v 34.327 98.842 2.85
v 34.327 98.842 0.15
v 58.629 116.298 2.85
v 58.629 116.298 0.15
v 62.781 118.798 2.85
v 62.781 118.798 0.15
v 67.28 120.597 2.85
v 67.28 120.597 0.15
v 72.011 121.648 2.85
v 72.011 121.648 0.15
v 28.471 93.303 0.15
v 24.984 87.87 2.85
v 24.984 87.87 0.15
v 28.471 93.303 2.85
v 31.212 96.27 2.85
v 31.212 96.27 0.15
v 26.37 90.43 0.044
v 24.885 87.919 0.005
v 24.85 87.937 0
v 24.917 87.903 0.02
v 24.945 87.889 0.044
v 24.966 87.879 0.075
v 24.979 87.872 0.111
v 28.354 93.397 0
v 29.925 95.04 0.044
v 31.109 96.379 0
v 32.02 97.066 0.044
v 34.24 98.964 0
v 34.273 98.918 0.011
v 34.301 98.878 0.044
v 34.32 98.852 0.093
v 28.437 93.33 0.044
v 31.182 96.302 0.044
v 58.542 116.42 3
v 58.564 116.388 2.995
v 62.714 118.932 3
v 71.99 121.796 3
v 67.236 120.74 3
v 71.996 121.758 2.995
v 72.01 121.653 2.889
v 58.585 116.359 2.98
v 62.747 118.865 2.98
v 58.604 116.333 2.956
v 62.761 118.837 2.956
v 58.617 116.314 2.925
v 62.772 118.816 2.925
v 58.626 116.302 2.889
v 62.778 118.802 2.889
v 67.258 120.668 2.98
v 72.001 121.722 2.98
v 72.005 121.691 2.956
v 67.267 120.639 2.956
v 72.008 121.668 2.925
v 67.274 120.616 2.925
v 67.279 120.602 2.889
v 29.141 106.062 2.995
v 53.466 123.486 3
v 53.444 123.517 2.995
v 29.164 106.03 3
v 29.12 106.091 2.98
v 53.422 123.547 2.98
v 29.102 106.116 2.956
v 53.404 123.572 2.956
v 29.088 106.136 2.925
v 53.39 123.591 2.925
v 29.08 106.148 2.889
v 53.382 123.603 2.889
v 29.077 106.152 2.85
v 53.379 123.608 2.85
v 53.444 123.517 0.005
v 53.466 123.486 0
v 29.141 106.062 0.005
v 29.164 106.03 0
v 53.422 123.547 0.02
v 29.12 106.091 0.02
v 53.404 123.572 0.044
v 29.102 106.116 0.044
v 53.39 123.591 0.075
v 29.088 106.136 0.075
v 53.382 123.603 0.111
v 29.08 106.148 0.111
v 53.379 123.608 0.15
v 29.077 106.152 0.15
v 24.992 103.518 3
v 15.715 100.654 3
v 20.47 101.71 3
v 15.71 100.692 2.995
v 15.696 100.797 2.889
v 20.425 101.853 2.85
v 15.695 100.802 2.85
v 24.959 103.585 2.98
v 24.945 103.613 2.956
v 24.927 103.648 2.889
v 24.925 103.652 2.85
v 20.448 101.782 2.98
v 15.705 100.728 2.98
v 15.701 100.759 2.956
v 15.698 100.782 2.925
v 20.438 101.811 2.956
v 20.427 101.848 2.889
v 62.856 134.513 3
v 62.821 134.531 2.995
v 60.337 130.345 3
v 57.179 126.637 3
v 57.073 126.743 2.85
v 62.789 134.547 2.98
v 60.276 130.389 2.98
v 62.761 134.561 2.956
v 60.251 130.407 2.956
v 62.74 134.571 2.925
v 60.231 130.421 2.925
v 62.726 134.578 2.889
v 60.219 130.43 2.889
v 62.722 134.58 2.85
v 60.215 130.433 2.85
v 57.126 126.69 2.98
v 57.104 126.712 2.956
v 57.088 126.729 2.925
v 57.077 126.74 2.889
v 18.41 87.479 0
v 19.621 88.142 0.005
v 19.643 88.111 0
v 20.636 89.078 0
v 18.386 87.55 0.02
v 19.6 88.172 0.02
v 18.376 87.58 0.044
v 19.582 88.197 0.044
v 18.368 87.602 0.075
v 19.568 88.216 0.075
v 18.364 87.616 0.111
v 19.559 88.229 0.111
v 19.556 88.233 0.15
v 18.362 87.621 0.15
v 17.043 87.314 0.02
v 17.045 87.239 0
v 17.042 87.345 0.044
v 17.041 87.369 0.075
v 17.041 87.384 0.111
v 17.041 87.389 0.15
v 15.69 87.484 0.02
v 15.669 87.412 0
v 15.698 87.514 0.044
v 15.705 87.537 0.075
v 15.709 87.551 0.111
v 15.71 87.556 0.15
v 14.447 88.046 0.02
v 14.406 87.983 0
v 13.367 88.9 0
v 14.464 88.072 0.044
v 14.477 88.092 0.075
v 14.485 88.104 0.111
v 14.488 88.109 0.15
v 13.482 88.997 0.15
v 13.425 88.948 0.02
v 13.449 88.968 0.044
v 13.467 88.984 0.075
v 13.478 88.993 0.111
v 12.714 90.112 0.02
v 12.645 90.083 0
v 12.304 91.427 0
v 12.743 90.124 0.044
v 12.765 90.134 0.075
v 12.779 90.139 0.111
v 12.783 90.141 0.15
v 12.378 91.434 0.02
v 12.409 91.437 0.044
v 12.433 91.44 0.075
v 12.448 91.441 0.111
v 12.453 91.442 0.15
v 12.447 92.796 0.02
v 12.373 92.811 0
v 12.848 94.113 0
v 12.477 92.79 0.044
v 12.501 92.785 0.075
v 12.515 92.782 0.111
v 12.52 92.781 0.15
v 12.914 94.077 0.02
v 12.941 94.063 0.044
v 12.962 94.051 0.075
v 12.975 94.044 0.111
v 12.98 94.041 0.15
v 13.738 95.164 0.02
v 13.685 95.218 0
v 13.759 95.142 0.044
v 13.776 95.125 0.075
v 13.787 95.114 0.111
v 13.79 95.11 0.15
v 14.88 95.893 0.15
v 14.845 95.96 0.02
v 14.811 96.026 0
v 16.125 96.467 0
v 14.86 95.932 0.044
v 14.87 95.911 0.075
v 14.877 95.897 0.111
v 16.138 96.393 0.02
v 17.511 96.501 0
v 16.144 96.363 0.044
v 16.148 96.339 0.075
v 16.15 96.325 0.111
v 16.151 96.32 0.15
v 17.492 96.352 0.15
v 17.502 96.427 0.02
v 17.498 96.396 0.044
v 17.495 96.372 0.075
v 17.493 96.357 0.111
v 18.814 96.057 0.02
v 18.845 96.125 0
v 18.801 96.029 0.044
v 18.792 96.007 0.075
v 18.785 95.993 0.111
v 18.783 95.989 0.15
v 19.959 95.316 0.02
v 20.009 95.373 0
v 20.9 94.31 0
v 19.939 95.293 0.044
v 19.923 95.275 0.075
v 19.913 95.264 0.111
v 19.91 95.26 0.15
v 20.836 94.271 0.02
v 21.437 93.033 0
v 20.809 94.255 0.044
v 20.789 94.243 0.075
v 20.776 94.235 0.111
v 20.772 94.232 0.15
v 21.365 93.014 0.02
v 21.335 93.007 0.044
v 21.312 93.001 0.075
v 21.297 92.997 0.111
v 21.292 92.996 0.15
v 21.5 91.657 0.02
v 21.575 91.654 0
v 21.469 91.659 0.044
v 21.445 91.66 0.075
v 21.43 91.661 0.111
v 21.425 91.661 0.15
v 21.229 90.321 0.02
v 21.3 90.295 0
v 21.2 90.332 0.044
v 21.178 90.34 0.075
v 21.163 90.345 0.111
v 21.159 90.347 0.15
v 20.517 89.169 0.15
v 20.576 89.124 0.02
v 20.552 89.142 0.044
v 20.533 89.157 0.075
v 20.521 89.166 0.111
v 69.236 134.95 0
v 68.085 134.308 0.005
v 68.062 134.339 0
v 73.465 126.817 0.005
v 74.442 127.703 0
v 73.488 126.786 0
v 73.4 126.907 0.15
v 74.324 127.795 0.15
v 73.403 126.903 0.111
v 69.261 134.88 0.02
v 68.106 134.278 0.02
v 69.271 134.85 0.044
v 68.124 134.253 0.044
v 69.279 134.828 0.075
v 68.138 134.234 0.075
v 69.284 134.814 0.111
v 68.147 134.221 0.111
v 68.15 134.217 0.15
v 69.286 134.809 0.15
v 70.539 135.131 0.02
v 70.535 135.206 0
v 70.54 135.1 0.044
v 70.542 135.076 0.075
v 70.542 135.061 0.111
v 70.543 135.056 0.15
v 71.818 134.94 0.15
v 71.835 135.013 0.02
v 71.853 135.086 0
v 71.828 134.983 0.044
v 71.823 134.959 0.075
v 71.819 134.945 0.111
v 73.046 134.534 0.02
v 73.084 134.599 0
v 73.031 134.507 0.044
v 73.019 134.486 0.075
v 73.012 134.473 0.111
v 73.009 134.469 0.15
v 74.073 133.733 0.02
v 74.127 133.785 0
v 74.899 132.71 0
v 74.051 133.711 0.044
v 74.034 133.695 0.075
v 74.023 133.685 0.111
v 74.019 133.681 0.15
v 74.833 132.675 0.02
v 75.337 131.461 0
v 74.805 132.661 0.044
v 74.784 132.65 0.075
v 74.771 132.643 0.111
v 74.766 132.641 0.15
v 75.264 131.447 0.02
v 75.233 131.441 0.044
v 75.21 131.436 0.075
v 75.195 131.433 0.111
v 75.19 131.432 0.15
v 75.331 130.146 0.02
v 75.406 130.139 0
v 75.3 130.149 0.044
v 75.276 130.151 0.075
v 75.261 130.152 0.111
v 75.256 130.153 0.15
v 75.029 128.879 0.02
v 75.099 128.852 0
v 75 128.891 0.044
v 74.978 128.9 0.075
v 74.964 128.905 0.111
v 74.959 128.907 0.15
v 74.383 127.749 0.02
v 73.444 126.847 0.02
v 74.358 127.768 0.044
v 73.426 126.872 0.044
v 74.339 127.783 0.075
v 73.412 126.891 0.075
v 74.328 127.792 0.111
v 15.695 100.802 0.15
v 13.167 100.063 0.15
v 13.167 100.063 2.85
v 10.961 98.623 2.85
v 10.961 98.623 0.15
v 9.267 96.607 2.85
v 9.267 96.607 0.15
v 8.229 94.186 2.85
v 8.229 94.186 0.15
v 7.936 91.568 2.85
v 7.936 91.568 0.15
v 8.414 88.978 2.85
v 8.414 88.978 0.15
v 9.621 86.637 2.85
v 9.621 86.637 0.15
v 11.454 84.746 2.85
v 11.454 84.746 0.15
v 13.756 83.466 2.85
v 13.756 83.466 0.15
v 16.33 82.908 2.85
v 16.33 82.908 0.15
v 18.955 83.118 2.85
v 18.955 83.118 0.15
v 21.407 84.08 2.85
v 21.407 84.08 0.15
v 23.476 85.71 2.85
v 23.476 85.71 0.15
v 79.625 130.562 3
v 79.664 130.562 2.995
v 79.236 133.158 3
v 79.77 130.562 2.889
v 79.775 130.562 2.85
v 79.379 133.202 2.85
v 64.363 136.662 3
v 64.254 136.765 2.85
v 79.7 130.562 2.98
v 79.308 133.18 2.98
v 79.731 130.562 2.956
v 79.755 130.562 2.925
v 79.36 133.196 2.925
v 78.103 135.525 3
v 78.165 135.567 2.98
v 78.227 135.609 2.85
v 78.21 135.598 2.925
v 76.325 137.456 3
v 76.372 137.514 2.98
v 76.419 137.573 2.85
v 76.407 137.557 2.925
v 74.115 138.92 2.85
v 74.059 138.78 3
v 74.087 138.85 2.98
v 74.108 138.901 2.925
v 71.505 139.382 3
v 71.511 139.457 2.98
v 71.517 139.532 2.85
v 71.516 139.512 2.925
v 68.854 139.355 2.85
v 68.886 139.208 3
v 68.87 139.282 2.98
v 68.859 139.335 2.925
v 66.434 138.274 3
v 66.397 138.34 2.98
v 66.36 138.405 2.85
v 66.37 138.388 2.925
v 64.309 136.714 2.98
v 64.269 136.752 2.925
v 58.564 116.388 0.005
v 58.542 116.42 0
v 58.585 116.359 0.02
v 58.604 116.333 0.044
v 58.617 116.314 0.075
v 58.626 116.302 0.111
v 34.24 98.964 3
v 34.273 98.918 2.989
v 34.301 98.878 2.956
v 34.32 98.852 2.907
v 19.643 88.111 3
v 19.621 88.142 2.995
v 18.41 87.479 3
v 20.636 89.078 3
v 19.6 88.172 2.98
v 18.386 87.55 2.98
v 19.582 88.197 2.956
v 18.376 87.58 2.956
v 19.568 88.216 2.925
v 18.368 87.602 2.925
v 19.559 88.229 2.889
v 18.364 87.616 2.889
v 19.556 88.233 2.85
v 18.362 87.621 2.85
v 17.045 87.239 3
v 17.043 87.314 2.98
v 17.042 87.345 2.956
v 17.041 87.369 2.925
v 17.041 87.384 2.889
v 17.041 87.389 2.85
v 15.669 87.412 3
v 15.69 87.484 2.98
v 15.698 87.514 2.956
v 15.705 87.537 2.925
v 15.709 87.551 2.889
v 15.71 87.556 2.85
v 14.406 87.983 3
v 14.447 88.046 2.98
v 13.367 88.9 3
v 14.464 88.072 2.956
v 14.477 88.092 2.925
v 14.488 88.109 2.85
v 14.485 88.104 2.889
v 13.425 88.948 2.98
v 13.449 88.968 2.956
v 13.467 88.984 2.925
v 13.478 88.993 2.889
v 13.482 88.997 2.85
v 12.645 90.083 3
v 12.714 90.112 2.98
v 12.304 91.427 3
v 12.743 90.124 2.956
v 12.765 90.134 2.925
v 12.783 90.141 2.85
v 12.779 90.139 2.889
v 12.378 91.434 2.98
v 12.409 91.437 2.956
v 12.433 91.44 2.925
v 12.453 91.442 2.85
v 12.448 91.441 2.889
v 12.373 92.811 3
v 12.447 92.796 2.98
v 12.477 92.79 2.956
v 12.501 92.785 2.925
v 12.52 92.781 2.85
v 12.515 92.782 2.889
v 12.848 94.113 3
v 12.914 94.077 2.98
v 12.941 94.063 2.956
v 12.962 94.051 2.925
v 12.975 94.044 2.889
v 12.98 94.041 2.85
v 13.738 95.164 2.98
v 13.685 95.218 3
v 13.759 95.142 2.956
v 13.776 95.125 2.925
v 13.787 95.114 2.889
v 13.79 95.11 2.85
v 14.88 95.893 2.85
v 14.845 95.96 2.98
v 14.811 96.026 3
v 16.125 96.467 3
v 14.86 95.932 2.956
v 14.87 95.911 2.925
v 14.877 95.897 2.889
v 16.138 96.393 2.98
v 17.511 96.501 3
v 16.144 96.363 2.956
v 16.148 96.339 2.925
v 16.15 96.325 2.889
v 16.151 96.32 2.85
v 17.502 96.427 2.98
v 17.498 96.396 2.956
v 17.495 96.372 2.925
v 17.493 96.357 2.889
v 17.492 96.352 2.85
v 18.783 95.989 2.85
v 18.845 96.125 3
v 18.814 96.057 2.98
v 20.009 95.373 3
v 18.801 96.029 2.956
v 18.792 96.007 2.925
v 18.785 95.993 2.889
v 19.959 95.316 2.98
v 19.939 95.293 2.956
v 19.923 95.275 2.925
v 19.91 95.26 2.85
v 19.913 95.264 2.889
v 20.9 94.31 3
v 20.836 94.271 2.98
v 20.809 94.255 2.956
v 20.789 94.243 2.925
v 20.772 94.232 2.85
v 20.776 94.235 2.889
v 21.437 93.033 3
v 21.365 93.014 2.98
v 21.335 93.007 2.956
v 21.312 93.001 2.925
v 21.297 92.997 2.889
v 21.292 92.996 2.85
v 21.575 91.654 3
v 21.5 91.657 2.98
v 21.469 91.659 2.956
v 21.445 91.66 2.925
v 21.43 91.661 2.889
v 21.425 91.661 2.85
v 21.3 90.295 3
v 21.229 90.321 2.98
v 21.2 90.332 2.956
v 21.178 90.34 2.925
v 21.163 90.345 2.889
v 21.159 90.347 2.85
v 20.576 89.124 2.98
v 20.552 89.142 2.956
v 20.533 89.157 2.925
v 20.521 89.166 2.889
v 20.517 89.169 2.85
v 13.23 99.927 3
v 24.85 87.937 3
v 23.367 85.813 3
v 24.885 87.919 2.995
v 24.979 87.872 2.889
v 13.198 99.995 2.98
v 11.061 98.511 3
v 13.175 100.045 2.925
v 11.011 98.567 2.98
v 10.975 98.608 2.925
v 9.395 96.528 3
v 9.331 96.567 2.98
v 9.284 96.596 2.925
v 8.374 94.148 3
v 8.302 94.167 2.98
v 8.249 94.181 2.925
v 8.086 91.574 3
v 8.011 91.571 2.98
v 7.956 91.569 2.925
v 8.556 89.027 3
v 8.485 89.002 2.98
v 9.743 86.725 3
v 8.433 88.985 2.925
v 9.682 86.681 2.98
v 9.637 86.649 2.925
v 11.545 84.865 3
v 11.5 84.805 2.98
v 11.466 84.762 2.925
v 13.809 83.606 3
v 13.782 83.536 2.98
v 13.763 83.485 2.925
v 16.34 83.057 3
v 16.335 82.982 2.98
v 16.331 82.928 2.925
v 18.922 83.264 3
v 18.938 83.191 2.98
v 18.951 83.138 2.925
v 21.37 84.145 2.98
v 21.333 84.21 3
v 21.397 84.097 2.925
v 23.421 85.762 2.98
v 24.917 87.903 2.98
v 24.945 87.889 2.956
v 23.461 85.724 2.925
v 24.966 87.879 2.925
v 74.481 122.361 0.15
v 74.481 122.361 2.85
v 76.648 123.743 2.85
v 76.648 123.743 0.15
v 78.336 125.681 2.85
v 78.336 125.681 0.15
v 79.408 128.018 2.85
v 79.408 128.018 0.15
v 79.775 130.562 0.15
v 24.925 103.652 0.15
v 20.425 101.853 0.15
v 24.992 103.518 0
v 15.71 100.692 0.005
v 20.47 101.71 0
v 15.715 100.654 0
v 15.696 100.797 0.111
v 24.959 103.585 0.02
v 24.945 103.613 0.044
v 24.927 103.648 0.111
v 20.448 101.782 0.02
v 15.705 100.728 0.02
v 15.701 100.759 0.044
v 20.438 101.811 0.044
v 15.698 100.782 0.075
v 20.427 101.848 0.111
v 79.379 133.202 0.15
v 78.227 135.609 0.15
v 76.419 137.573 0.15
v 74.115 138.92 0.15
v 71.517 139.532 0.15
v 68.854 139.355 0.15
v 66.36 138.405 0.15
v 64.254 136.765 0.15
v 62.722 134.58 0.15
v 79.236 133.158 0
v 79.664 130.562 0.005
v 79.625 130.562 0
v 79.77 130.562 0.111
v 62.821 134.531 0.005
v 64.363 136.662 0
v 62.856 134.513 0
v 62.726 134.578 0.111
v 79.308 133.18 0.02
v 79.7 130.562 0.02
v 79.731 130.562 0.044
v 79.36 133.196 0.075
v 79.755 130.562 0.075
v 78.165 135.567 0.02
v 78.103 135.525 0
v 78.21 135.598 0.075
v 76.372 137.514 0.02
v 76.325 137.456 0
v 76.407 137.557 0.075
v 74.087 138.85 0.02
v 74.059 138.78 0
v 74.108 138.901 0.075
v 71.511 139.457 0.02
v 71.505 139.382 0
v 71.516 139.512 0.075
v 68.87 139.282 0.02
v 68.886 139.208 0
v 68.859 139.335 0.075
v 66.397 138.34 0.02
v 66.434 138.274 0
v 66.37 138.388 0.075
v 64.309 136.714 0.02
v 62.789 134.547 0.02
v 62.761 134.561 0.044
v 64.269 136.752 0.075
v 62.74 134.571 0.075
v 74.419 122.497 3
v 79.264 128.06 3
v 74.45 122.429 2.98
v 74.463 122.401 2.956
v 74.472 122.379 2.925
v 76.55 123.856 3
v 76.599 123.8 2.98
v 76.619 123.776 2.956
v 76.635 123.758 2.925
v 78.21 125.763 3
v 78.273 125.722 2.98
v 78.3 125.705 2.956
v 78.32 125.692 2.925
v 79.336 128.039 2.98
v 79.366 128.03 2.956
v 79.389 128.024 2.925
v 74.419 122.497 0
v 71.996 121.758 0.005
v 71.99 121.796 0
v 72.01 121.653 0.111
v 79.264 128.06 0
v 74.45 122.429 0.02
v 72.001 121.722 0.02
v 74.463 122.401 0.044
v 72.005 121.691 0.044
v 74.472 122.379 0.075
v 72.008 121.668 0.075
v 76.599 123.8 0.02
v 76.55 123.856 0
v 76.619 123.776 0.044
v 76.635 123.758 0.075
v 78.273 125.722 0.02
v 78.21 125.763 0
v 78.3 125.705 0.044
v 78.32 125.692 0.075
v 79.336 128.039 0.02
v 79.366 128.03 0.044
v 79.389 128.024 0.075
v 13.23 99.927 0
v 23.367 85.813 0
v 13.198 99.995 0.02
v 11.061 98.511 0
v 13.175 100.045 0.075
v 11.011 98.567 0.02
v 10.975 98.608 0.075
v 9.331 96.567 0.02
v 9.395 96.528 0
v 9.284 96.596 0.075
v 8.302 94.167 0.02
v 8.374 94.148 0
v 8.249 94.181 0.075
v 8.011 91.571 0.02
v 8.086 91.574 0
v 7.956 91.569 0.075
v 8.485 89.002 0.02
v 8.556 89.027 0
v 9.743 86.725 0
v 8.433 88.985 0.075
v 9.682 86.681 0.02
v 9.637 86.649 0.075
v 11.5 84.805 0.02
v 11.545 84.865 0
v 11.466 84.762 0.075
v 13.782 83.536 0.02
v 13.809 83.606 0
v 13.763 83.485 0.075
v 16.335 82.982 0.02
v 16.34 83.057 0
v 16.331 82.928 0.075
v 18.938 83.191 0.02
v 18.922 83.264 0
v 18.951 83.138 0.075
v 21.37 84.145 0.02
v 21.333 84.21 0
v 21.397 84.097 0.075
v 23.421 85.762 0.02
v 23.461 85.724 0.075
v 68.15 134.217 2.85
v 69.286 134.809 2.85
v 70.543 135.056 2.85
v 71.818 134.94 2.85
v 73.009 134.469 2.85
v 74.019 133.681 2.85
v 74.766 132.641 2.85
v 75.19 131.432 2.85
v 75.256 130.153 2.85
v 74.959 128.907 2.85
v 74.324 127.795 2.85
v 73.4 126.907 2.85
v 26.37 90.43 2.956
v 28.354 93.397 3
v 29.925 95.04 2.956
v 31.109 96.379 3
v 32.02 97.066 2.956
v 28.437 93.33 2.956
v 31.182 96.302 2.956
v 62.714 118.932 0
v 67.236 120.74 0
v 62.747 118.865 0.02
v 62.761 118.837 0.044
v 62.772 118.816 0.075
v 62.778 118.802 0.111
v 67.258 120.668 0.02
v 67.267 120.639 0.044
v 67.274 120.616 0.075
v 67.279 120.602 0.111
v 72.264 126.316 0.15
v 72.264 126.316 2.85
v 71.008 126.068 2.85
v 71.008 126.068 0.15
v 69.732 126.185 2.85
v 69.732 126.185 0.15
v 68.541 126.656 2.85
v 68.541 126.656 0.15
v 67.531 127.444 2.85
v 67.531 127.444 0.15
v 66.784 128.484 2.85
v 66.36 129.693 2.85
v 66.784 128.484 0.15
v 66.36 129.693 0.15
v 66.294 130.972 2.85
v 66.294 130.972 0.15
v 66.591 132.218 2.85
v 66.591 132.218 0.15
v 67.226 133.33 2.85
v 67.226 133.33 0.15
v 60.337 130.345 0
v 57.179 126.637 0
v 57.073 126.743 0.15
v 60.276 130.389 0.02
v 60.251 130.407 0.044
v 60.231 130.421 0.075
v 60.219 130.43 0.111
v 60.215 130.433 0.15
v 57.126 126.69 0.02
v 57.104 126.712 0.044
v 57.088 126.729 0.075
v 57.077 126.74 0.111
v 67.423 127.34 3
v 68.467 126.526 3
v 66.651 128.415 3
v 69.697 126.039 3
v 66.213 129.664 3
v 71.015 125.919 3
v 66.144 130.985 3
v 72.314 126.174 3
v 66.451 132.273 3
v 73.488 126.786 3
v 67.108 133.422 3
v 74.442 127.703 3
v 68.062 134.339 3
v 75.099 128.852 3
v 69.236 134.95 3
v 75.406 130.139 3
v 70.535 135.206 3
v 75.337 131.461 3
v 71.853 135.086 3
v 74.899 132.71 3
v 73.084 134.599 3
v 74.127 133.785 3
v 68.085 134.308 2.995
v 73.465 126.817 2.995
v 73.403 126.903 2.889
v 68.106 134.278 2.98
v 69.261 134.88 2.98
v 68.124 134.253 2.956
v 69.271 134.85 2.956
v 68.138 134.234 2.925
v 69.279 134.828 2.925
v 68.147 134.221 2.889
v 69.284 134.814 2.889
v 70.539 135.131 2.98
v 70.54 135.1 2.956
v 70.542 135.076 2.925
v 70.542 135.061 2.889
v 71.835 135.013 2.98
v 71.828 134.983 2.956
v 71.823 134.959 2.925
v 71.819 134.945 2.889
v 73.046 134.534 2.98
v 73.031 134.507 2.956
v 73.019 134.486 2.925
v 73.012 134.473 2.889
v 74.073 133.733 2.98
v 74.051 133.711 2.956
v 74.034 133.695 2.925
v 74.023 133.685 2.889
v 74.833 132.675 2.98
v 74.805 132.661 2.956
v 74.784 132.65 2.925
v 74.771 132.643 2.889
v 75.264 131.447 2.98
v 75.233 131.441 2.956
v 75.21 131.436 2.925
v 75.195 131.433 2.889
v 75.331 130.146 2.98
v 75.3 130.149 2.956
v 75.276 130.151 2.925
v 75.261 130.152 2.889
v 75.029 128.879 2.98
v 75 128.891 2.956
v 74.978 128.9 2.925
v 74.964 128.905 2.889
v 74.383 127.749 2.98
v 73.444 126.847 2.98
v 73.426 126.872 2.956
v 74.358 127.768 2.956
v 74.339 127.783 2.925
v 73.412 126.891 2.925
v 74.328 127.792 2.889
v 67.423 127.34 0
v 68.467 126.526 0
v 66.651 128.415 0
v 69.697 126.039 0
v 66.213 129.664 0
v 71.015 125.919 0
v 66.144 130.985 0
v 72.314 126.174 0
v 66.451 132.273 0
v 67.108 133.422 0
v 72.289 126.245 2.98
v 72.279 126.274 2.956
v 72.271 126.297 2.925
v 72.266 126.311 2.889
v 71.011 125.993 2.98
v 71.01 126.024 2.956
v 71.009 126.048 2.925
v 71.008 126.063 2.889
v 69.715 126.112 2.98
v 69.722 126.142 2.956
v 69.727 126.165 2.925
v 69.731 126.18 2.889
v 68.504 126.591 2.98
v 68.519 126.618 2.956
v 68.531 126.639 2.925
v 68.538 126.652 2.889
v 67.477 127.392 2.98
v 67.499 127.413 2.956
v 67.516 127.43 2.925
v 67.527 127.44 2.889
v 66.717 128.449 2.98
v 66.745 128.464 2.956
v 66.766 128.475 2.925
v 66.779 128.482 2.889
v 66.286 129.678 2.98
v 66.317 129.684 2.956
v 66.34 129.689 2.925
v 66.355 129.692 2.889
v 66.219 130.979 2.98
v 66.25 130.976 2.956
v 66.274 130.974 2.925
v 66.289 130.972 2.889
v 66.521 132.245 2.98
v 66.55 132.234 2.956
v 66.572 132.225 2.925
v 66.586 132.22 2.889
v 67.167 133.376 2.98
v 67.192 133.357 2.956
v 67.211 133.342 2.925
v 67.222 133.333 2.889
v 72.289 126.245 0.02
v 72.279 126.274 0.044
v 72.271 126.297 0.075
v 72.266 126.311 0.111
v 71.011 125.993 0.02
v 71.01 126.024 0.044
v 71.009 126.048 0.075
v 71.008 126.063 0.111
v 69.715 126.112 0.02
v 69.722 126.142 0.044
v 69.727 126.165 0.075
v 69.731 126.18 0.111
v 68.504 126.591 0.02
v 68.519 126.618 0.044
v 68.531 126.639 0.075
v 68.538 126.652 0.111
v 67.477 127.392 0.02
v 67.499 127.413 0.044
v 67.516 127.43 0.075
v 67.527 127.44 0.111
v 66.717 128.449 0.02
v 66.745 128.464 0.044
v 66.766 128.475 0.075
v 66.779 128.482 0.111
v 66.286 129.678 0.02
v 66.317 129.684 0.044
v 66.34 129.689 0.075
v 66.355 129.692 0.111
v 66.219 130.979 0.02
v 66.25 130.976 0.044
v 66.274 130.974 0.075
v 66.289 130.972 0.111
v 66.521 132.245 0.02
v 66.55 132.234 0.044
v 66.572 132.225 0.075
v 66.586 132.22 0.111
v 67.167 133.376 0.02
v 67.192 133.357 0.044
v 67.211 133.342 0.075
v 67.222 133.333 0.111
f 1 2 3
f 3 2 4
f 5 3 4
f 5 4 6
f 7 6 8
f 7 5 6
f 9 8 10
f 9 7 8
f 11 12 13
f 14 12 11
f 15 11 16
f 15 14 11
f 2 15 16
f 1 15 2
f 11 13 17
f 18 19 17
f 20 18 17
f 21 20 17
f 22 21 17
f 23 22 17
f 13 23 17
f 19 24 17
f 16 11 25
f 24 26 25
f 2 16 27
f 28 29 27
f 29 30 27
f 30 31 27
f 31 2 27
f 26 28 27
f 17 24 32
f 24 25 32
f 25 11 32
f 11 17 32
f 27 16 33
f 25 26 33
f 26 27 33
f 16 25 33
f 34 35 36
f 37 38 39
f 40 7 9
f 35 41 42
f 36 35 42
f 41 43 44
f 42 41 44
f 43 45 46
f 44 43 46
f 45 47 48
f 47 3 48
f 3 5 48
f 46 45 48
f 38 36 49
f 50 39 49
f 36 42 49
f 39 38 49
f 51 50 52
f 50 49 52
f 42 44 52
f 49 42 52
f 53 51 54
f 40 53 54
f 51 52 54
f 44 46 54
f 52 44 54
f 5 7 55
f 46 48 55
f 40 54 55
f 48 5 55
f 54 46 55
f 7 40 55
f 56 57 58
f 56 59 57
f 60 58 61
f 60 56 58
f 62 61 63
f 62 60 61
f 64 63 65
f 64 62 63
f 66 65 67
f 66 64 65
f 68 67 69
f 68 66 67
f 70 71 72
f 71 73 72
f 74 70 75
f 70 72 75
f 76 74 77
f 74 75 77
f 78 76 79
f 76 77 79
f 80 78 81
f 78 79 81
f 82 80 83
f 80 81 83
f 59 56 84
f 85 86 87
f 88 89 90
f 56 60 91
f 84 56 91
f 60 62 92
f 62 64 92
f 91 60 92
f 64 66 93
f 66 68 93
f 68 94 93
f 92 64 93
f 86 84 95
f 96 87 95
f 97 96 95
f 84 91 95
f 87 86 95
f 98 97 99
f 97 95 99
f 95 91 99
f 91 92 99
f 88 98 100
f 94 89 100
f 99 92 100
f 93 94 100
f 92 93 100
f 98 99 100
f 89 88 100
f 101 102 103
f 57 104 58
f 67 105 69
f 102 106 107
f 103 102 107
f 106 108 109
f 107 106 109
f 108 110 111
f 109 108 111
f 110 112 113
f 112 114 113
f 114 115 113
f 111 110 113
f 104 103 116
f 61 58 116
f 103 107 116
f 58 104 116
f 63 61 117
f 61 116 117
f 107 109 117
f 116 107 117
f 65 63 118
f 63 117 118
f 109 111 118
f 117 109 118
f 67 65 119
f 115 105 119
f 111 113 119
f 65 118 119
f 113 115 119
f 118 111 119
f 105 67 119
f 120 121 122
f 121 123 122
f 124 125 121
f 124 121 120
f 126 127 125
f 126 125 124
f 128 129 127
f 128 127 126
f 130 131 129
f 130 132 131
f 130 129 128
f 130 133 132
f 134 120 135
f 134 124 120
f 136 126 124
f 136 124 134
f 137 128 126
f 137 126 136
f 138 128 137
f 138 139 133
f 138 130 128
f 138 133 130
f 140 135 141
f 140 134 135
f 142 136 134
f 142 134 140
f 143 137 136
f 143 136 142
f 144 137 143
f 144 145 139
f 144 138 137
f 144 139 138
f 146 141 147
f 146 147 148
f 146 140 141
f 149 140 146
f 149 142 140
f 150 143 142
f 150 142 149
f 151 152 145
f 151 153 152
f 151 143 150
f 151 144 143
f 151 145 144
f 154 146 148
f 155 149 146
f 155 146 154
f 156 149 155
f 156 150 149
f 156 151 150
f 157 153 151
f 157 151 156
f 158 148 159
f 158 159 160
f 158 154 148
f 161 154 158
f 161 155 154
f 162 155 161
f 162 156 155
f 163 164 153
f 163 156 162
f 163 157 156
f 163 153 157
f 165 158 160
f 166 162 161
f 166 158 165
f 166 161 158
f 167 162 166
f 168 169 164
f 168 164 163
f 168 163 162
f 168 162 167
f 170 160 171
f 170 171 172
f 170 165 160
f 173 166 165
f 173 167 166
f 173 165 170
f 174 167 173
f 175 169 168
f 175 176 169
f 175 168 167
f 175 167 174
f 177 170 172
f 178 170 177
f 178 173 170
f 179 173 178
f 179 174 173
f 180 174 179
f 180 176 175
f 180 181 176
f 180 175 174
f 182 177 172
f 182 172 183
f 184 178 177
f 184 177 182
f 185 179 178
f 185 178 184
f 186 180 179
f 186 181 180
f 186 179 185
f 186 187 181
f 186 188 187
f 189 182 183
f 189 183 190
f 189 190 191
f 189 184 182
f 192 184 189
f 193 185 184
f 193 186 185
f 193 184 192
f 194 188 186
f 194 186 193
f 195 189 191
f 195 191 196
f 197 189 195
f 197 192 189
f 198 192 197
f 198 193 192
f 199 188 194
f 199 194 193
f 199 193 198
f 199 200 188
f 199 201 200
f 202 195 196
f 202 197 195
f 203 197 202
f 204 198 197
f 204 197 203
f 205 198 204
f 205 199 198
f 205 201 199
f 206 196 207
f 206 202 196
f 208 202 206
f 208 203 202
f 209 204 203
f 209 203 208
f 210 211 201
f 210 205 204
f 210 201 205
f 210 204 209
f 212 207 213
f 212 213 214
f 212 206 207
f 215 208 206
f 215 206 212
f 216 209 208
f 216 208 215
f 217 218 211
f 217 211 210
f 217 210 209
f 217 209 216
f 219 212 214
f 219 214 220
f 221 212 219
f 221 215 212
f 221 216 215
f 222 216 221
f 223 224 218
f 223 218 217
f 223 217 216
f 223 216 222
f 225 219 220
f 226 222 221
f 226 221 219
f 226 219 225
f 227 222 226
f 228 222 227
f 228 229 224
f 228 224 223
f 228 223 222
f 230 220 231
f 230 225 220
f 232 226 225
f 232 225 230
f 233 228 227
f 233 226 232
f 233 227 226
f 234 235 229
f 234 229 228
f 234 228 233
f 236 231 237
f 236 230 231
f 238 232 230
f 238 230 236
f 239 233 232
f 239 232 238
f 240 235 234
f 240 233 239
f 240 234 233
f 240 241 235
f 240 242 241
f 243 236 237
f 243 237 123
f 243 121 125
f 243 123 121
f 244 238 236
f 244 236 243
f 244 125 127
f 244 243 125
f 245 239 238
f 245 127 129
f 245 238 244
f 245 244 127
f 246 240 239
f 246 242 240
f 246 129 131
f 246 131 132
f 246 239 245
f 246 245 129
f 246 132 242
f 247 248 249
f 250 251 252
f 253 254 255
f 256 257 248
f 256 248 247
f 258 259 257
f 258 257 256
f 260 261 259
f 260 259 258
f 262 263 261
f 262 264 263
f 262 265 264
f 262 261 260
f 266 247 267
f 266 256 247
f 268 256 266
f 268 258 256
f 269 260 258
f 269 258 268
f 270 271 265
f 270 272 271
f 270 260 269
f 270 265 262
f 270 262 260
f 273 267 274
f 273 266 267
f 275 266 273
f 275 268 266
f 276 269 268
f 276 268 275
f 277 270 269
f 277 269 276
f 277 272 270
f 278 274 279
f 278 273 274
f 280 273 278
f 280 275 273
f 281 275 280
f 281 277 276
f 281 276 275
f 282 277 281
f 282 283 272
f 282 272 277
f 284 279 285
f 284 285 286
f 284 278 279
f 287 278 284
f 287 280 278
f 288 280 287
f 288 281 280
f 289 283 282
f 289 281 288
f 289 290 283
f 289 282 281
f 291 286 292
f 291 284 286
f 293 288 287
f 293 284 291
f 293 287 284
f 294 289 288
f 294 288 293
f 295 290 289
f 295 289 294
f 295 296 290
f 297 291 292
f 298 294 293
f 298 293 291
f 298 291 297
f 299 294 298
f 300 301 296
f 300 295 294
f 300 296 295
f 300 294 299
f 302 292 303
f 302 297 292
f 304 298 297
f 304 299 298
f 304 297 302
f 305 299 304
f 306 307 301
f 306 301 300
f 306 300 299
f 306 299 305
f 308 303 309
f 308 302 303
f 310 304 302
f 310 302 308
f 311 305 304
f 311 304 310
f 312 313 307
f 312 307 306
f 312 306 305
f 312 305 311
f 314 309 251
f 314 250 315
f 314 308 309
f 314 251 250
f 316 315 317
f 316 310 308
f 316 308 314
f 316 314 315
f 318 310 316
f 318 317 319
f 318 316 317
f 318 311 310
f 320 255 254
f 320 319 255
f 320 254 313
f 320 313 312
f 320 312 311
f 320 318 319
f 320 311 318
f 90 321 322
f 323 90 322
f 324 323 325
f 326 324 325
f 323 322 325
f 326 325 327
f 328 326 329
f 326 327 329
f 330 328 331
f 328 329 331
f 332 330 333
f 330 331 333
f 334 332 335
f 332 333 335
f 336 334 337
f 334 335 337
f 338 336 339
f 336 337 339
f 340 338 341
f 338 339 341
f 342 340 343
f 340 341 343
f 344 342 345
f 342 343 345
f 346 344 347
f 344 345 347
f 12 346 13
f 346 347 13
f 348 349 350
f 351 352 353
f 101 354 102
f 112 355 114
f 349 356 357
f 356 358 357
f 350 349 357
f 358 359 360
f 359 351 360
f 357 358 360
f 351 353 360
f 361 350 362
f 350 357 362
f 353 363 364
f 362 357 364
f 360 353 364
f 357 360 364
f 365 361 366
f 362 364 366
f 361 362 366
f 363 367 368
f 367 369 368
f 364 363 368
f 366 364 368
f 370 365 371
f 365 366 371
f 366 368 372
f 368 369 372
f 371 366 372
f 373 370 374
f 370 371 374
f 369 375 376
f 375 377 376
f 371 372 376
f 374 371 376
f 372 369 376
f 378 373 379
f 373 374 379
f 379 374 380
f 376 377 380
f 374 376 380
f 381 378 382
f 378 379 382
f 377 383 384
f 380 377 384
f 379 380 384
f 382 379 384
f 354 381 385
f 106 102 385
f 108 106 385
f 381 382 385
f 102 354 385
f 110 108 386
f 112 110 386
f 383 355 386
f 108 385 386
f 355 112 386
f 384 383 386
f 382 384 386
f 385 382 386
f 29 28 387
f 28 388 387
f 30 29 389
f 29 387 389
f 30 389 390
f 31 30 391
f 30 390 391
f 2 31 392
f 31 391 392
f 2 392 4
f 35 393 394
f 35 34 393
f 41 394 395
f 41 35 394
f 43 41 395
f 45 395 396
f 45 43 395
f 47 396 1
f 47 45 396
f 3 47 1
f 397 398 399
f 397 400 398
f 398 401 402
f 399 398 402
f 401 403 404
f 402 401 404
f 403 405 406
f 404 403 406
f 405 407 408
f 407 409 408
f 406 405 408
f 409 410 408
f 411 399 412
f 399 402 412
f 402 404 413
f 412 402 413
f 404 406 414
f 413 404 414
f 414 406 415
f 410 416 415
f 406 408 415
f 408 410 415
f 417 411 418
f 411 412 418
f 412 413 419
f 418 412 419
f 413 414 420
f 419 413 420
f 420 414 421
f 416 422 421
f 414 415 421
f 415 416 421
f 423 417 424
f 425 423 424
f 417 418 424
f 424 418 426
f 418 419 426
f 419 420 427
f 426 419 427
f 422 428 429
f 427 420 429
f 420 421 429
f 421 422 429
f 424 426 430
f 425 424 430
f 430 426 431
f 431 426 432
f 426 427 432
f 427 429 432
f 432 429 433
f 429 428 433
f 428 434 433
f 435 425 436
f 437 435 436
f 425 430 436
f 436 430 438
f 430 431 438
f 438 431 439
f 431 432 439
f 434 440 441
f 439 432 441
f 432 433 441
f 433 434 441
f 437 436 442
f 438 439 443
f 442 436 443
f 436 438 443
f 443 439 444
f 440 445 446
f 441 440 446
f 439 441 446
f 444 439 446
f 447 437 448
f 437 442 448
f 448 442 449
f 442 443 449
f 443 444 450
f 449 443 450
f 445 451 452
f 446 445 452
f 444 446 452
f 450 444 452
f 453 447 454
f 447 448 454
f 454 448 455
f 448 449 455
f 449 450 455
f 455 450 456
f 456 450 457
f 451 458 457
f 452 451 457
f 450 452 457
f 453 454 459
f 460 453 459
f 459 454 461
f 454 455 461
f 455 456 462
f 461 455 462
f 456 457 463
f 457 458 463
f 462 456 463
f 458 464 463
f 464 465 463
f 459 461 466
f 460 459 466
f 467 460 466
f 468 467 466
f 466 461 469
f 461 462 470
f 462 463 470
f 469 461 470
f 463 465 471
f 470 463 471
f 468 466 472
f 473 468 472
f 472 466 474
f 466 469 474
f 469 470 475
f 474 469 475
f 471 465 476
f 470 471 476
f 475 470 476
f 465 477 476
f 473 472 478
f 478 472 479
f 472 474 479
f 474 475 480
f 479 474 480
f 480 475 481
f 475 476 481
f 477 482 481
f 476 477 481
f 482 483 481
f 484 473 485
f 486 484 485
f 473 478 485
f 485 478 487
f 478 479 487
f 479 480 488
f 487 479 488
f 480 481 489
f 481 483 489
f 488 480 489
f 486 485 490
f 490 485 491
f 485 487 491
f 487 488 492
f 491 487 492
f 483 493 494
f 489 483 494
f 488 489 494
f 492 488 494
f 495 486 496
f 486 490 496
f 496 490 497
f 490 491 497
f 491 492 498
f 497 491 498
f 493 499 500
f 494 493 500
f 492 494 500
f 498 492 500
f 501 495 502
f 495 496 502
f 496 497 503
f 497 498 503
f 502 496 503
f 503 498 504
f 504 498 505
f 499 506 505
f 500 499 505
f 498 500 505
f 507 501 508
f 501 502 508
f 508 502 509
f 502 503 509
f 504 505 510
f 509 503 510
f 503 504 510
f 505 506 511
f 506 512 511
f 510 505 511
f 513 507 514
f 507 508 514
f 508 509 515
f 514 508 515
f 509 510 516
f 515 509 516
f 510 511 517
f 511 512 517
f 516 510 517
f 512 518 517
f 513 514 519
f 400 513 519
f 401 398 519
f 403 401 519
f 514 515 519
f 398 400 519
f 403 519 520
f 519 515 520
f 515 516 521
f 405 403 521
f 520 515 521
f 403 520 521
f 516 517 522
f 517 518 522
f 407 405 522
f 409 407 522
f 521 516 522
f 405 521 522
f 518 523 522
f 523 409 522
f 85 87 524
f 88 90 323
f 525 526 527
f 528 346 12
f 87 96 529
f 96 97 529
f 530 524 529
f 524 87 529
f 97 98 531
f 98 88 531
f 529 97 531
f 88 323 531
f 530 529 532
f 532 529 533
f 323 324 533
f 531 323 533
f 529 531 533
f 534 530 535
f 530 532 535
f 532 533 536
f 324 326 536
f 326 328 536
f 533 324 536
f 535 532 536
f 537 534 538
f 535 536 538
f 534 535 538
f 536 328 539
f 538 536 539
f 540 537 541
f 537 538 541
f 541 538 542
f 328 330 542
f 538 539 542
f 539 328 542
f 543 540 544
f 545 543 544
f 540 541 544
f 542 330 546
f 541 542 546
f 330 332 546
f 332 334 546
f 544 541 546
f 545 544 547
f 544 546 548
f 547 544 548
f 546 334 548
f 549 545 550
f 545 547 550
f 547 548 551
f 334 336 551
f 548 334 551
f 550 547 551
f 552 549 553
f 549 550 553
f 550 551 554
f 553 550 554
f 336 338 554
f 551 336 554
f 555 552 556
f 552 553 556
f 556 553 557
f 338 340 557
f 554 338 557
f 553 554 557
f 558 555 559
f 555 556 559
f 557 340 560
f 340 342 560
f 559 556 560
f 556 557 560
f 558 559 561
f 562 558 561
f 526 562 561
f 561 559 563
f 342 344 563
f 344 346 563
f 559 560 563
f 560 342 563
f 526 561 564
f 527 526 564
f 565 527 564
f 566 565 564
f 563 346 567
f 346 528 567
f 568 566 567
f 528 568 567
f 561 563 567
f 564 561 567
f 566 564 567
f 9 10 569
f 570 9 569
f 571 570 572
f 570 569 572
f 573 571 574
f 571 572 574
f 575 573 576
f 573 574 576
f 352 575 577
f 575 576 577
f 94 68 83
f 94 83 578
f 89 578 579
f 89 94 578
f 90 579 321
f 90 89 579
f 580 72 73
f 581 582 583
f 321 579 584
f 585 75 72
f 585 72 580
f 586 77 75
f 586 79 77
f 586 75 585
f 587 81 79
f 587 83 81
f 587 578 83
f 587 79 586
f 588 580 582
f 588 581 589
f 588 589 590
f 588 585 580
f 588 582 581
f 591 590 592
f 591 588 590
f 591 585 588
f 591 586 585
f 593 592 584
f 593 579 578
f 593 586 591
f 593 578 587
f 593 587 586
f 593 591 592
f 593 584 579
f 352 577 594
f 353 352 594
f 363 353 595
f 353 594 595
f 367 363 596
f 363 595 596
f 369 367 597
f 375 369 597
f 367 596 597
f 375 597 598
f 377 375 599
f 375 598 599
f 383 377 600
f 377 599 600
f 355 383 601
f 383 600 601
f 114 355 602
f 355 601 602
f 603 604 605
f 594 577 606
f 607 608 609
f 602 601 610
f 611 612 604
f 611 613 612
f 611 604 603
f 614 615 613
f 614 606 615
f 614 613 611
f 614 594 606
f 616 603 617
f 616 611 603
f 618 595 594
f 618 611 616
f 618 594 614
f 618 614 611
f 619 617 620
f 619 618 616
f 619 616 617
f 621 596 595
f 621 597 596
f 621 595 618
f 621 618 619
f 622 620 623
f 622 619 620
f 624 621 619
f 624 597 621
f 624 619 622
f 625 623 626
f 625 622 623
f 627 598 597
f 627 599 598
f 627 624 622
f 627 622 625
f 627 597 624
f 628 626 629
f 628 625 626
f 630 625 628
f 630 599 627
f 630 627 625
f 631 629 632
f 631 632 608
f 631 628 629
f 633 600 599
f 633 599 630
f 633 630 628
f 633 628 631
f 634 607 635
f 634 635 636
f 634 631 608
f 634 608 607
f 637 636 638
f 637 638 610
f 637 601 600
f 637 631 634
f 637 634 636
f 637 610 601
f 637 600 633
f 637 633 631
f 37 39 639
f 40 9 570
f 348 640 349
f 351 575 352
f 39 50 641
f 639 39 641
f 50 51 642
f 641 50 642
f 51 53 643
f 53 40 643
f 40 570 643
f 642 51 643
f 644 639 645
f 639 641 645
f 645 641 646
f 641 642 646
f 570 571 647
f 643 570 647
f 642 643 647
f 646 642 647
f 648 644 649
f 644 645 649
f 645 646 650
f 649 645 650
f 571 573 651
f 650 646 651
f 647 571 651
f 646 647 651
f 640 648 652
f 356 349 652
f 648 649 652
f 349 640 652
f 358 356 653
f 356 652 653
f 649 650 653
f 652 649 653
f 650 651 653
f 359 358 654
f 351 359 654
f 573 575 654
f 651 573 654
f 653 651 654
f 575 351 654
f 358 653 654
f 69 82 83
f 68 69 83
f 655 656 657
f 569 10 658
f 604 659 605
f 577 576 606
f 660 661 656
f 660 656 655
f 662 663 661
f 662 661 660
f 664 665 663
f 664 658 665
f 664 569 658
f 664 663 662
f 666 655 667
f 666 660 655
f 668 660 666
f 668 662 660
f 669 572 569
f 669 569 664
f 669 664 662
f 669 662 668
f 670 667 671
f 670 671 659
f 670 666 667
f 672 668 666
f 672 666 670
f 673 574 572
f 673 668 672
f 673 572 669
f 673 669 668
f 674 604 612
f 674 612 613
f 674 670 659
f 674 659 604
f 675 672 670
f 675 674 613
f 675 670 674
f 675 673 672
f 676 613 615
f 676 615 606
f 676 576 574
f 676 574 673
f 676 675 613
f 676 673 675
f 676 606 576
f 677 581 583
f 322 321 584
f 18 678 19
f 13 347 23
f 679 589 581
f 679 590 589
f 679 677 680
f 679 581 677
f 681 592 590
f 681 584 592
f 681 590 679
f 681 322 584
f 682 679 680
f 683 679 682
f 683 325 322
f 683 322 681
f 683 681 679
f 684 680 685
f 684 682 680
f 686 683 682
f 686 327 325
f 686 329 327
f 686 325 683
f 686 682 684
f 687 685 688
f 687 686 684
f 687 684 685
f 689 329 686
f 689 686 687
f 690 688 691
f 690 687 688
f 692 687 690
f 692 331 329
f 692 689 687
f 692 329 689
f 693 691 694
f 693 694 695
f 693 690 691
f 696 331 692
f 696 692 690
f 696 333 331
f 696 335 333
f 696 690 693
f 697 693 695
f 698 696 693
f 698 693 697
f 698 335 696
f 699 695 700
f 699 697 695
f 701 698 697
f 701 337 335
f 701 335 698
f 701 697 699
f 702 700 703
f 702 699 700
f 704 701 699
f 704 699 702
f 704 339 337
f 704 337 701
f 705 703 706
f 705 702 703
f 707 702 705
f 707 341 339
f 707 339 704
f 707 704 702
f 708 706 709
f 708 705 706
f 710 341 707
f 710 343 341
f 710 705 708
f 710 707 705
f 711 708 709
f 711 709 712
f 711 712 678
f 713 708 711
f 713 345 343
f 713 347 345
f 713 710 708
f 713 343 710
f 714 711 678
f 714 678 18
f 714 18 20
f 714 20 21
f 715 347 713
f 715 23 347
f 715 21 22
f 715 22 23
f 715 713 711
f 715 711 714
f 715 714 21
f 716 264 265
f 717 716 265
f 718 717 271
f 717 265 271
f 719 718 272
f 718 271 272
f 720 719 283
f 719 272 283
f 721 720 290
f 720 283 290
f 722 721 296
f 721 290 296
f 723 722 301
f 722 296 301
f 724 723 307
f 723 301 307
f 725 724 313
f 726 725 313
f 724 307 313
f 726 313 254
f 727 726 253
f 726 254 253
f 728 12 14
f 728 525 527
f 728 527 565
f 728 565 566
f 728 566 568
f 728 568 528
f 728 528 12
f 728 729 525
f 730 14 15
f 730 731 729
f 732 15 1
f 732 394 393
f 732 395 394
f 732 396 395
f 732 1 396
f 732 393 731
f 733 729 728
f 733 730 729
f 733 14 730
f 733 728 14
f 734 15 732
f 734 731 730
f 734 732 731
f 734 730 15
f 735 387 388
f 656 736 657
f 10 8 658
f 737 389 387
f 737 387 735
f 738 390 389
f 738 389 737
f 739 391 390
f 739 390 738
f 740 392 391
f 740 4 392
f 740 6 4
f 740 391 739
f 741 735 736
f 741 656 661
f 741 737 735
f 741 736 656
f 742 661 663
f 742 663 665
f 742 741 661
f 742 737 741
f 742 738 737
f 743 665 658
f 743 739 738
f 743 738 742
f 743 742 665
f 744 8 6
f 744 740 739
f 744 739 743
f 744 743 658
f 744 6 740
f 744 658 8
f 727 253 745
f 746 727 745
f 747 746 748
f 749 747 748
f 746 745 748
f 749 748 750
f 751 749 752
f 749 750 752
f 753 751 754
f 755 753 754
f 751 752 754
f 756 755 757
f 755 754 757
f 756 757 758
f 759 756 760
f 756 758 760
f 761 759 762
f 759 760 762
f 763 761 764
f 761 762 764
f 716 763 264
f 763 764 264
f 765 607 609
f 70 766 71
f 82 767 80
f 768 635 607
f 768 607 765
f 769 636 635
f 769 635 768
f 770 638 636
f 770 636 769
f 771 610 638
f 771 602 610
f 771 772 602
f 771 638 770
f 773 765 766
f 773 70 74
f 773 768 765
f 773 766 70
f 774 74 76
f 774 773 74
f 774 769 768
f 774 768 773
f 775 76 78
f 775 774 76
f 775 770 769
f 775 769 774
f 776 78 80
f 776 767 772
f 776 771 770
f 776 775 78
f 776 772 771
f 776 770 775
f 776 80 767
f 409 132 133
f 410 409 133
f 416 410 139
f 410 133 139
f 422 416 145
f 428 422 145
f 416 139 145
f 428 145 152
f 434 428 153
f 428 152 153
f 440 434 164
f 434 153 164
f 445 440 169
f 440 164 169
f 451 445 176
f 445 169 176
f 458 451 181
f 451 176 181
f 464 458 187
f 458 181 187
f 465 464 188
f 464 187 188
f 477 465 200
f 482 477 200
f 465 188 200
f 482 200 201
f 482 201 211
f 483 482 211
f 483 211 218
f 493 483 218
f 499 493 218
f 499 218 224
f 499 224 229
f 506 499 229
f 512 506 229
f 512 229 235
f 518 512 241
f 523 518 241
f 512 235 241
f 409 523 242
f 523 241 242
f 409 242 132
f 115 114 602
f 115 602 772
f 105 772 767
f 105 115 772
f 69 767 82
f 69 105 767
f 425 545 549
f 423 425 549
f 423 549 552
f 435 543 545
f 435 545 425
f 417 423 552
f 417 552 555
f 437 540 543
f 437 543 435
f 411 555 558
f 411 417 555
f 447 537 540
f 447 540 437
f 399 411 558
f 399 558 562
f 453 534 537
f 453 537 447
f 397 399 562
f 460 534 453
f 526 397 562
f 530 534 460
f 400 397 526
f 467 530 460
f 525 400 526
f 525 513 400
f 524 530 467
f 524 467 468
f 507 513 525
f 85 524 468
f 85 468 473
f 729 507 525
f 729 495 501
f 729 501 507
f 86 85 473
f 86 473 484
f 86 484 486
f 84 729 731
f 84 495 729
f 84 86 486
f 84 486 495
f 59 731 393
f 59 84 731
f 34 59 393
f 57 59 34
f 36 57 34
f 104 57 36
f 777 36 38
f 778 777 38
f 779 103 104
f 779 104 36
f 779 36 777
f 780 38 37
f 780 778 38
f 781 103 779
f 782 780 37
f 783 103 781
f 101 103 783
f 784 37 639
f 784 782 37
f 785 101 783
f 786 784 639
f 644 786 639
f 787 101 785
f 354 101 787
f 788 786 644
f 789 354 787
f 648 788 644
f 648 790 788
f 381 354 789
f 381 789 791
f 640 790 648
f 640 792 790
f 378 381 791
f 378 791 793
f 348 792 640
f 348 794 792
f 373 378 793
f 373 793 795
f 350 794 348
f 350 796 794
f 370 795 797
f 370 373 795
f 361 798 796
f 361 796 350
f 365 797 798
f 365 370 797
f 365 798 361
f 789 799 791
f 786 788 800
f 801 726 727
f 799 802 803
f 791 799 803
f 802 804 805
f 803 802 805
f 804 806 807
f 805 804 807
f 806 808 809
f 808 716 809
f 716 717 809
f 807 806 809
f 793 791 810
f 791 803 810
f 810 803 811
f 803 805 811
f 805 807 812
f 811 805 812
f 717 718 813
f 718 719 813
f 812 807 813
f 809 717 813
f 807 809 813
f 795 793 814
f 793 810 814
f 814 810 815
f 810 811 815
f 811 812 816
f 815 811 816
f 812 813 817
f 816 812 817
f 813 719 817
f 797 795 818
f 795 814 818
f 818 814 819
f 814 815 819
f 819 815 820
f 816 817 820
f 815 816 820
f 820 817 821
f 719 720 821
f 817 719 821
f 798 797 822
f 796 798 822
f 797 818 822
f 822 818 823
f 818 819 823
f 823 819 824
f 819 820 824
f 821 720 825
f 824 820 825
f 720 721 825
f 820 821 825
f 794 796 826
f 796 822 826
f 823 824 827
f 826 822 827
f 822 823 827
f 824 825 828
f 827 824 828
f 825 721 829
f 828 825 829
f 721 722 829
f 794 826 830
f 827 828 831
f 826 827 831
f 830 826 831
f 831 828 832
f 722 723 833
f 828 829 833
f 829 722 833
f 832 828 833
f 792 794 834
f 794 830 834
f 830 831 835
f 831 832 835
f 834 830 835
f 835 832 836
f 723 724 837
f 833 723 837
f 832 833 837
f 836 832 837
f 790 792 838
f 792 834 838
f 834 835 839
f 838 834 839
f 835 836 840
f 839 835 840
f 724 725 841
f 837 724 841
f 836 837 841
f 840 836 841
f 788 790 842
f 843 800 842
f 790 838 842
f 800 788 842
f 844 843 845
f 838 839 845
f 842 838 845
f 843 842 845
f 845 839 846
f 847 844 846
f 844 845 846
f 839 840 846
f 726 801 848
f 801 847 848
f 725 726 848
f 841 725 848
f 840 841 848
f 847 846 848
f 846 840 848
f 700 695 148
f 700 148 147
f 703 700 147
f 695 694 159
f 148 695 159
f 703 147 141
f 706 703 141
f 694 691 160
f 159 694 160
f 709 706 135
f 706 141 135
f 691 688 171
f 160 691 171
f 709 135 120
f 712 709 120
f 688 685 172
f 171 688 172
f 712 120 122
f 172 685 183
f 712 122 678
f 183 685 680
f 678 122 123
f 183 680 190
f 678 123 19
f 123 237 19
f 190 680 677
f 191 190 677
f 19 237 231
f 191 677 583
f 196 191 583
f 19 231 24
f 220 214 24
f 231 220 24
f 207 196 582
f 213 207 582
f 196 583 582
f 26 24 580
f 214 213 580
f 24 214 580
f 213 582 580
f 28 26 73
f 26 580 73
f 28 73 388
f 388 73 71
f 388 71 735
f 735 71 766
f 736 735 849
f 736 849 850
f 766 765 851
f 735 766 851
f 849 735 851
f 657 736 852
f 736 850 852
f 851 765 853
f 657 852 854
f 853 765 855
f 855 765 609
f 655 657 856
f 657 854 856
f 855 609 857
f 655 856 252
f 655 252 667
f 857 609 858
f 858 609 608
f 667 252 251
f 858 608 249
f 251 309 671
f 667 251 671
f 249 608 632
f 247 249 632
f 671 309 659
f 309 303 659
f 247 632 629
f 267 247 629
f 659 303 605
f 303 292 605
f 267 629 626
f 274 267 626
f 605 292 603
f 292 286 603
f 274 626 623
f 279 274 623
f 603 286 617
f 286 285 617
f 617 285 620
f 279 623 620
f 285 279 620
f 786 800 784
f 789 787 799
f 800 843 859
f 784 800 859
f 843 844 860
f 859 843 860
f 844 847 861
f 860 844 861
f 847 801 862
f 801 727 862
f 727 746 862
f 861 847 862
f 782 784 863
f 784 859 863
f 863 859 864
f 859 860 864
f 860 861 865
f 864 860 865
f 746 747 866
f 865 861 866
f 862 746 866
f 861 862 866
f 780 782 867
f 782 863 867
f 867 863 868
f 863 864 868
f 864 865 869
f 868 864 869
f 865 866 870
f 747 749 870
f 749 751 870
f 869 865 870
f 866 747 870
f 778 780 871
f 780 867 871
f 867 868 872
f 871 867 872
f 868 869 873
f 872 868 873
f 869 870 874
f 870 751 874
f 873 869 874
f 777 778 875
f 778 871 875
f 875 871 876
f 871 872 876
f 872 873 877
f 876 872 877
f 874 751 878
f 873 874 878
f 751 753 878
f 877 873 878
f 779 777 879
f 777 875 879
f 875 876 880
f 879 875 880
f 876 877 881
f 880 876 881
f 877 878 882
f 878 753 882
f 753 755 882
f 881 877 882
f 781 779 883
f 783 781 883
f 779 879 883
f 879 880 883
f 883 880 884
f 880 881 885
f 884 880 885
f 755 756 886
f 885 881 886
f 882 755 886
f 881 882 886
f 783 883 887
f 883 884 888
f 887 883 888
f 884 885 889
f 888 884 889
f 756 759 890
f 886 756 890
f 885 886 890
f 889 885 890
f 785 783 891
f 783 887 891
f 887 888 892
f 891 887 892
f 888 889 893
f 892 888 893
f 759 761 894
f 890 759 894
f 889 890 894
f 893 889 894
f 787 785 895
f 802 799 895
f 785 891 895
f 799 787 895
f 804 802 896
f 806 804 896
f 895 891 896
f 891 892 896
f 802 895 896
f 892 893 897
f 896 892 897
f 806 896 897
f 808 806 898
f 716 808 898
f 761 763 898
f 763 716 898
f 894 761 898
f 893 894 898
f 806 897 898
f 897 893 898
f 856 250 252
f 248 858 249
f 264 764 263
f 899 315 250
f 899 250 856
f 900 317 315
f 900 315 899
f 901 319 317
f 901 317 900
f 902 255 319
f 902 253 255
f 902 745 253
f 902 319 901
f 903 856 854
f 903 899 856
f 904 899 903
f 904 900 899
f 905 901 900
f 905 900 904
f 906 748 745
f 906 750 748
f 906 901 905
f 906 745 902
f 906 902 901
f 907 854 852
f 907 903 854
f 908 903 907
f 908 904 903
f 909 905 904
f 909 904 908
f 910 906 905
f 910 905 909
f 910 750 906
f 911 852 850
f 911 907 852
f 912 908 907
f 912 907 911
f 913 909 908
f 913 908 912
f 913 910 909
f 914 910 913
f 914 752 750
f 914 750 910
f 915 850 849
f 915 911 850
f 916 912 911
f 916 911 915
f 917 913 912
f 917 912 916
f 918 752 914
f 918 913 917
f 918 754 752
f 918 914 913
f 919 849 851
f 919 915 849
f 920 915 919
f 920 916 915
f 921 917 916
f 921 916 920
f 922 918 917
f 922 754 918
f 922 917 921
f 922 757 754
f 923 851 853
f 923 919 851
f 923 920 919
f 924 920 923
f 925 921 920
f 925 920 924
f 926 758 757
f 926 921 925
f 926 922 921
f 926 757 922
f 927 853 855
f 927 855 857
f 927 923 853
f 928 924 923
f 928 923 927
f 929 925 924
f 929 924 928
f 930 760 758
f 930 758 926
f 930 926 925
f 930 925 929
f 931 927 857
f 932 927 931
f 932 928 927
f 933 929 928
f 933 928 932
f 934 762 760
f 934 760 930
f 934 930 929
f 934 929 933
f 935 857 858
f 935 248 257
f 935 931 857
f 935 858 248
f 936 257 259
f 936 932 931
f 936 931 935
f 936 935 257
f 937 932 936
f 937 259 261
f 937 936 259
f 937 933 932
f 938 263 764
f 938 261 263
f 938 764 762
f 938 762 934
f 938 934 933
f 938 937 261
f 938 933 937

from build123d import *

# Parameters (mm, degrees)
BOSS_EXTRUDE1_DEPTH = 3
FILLET1_R           = 30
FILLET2_R           = 0.15


with BuildPart() as part:
    # Sketch1 → Boss-Extrude1 (new body)
    with BuildSketch(Plane.XY):
        with BuildLine():
            ThreePointArc((79.775032783, 130.56236121), (70.328436421, 139.551273919), (61.81935463, 129.670268829))
            Line((61.81935463, 129.670268829), (68.149825912, 134.217260509))
            ThreePointArc((68.149825912, 134.217260509), (74.429932082, 133.187568081), (73.400239654, 126.907461911))
            Line((73.400239654, 126.907461911), (67.069768371, 122.360470231))
            ThreePointArc((67.069768371, 122.360470231), (75.656252932, 123.001032633), (79.775032783, 130.56236121))
        make_face()
        with BuildLine():
            Line((61.81935463, 129.670268829), (20.635966041, 100.089449815))
            ThreePointArc((20.635966041, 100.089449815), (24.240500227, 97.137972577), (25.886379782, 92.779651217))
            Line((25.886379782, 92.779651217), (67.069768371, 122.360470231))
            ThreePointArc((67.069768371, 122.360470231), (63.465234185, 125.311947469), (61.81935463, 129.670268829))
        make_face()
        with BuildLine():
            ThreePointArc((19.555908499, 88.232659536), (13.27580233, 89.262351965), (14.305494758, 95.542458134))
            Line((14.305494758, 95.542458134), (20.635966041, 100.089449815))
            ThreePointArc((20.635966041, 100.089449815), (9.369373051, 87.006338686), (25.930701629, 91.887558835))
            ThreePointArc((25.930701629, 91.887558835), (25.919614338, 92.334155197), (25.886379782, 92.779651217))
            Line((25.886379782, 92.779651217), (19.555908499, 88.232659536))
        make_face()
        with BuildLine():
            Line((20.635966041, 100.089449815), (14.305494758, 95.542458134))
            ThreePointArc((14.305494758, 95.542458134), (20.585600928, 94.512765706), (19.555908499, 88.232659536))
            Line((19.555908499, 88.232659536), (25.886379782, 92.779651217))
            ThreePointArc((25.886379782, 92.779651217), (24.240500227, 97.137972577), (20.635966041, 100.089449815))
        make_face()
        with BuildLine():
            Line((68.149825912, 134.217260509), (61.81935463, 129.670268829))
            ThreePointArc((61.81935463, 129.670268829), (63.465234185, 125.311947469), (67.069768371, 122.360470231))
            Line((67.069768371, 122.360470231), (73.400239654, 126.907461911))
            ThreePointArc((73.400239654, 126.907461911), (67.120133484, 127.93715434), (68.149825912, 134.217260509))
        make_face()
    extrude(amount=BOSS_EXTRUDE1_DEPTH)

    # Fillet1
    fillet1_edges = [part.edges().sort_by_distance(p)[0] for p in [
        (61.81935463, 129.670268829, 1.5),
        (67.069768371, 122.360470231, 1.5),
        (25.886379782, 92.779651217, 1.5),
        (20.635966041, 100.089449815, 1.5),
    ]]
    fillet(fillet1_edges, radius=FILLET1_R)

    # Fillet2
    fillet2_edges = [part.edges().sort_by_distance(p)[0] for p in [
        (68.149825912, 134.217260509, 3),
        (9.620903031, 86.637145094, 0),
        (9.620903031, 86.637145094, 3),
        (41.227660335, 114.879859322, 0),
        (41.227660335, 114.879859322, 3),
        (46.478074076, 107.570060724, 0),
        (46.478074076, 107.570060724, 3),
        (19.555908499, 88.232659536, 3),
        (78.084831381, 135.812774952, 0),
        (78.084831381, 135.812774952, 3),
        (22.711724782, 102.661716239, 0),
        (22.711724782, 102.661716239, 3),
        (28.986832252, 93.925305349, 0),
        (28.986832252, 93.925305349, 3),
        (64.99400963, 119.788203807, 0),
        (64.99400963, 119.788203807, 3),
        (58.71890216, 128.524614697, 0),
        (58.71890216, 128.524614697, 3),
        (19.555908499, 88.232659536, 0),
        (68.149825912, 134.217260509, 0),
    ]]
    fillet(fillet2_edges, radius=FILLET2_R)


solid = part.part
